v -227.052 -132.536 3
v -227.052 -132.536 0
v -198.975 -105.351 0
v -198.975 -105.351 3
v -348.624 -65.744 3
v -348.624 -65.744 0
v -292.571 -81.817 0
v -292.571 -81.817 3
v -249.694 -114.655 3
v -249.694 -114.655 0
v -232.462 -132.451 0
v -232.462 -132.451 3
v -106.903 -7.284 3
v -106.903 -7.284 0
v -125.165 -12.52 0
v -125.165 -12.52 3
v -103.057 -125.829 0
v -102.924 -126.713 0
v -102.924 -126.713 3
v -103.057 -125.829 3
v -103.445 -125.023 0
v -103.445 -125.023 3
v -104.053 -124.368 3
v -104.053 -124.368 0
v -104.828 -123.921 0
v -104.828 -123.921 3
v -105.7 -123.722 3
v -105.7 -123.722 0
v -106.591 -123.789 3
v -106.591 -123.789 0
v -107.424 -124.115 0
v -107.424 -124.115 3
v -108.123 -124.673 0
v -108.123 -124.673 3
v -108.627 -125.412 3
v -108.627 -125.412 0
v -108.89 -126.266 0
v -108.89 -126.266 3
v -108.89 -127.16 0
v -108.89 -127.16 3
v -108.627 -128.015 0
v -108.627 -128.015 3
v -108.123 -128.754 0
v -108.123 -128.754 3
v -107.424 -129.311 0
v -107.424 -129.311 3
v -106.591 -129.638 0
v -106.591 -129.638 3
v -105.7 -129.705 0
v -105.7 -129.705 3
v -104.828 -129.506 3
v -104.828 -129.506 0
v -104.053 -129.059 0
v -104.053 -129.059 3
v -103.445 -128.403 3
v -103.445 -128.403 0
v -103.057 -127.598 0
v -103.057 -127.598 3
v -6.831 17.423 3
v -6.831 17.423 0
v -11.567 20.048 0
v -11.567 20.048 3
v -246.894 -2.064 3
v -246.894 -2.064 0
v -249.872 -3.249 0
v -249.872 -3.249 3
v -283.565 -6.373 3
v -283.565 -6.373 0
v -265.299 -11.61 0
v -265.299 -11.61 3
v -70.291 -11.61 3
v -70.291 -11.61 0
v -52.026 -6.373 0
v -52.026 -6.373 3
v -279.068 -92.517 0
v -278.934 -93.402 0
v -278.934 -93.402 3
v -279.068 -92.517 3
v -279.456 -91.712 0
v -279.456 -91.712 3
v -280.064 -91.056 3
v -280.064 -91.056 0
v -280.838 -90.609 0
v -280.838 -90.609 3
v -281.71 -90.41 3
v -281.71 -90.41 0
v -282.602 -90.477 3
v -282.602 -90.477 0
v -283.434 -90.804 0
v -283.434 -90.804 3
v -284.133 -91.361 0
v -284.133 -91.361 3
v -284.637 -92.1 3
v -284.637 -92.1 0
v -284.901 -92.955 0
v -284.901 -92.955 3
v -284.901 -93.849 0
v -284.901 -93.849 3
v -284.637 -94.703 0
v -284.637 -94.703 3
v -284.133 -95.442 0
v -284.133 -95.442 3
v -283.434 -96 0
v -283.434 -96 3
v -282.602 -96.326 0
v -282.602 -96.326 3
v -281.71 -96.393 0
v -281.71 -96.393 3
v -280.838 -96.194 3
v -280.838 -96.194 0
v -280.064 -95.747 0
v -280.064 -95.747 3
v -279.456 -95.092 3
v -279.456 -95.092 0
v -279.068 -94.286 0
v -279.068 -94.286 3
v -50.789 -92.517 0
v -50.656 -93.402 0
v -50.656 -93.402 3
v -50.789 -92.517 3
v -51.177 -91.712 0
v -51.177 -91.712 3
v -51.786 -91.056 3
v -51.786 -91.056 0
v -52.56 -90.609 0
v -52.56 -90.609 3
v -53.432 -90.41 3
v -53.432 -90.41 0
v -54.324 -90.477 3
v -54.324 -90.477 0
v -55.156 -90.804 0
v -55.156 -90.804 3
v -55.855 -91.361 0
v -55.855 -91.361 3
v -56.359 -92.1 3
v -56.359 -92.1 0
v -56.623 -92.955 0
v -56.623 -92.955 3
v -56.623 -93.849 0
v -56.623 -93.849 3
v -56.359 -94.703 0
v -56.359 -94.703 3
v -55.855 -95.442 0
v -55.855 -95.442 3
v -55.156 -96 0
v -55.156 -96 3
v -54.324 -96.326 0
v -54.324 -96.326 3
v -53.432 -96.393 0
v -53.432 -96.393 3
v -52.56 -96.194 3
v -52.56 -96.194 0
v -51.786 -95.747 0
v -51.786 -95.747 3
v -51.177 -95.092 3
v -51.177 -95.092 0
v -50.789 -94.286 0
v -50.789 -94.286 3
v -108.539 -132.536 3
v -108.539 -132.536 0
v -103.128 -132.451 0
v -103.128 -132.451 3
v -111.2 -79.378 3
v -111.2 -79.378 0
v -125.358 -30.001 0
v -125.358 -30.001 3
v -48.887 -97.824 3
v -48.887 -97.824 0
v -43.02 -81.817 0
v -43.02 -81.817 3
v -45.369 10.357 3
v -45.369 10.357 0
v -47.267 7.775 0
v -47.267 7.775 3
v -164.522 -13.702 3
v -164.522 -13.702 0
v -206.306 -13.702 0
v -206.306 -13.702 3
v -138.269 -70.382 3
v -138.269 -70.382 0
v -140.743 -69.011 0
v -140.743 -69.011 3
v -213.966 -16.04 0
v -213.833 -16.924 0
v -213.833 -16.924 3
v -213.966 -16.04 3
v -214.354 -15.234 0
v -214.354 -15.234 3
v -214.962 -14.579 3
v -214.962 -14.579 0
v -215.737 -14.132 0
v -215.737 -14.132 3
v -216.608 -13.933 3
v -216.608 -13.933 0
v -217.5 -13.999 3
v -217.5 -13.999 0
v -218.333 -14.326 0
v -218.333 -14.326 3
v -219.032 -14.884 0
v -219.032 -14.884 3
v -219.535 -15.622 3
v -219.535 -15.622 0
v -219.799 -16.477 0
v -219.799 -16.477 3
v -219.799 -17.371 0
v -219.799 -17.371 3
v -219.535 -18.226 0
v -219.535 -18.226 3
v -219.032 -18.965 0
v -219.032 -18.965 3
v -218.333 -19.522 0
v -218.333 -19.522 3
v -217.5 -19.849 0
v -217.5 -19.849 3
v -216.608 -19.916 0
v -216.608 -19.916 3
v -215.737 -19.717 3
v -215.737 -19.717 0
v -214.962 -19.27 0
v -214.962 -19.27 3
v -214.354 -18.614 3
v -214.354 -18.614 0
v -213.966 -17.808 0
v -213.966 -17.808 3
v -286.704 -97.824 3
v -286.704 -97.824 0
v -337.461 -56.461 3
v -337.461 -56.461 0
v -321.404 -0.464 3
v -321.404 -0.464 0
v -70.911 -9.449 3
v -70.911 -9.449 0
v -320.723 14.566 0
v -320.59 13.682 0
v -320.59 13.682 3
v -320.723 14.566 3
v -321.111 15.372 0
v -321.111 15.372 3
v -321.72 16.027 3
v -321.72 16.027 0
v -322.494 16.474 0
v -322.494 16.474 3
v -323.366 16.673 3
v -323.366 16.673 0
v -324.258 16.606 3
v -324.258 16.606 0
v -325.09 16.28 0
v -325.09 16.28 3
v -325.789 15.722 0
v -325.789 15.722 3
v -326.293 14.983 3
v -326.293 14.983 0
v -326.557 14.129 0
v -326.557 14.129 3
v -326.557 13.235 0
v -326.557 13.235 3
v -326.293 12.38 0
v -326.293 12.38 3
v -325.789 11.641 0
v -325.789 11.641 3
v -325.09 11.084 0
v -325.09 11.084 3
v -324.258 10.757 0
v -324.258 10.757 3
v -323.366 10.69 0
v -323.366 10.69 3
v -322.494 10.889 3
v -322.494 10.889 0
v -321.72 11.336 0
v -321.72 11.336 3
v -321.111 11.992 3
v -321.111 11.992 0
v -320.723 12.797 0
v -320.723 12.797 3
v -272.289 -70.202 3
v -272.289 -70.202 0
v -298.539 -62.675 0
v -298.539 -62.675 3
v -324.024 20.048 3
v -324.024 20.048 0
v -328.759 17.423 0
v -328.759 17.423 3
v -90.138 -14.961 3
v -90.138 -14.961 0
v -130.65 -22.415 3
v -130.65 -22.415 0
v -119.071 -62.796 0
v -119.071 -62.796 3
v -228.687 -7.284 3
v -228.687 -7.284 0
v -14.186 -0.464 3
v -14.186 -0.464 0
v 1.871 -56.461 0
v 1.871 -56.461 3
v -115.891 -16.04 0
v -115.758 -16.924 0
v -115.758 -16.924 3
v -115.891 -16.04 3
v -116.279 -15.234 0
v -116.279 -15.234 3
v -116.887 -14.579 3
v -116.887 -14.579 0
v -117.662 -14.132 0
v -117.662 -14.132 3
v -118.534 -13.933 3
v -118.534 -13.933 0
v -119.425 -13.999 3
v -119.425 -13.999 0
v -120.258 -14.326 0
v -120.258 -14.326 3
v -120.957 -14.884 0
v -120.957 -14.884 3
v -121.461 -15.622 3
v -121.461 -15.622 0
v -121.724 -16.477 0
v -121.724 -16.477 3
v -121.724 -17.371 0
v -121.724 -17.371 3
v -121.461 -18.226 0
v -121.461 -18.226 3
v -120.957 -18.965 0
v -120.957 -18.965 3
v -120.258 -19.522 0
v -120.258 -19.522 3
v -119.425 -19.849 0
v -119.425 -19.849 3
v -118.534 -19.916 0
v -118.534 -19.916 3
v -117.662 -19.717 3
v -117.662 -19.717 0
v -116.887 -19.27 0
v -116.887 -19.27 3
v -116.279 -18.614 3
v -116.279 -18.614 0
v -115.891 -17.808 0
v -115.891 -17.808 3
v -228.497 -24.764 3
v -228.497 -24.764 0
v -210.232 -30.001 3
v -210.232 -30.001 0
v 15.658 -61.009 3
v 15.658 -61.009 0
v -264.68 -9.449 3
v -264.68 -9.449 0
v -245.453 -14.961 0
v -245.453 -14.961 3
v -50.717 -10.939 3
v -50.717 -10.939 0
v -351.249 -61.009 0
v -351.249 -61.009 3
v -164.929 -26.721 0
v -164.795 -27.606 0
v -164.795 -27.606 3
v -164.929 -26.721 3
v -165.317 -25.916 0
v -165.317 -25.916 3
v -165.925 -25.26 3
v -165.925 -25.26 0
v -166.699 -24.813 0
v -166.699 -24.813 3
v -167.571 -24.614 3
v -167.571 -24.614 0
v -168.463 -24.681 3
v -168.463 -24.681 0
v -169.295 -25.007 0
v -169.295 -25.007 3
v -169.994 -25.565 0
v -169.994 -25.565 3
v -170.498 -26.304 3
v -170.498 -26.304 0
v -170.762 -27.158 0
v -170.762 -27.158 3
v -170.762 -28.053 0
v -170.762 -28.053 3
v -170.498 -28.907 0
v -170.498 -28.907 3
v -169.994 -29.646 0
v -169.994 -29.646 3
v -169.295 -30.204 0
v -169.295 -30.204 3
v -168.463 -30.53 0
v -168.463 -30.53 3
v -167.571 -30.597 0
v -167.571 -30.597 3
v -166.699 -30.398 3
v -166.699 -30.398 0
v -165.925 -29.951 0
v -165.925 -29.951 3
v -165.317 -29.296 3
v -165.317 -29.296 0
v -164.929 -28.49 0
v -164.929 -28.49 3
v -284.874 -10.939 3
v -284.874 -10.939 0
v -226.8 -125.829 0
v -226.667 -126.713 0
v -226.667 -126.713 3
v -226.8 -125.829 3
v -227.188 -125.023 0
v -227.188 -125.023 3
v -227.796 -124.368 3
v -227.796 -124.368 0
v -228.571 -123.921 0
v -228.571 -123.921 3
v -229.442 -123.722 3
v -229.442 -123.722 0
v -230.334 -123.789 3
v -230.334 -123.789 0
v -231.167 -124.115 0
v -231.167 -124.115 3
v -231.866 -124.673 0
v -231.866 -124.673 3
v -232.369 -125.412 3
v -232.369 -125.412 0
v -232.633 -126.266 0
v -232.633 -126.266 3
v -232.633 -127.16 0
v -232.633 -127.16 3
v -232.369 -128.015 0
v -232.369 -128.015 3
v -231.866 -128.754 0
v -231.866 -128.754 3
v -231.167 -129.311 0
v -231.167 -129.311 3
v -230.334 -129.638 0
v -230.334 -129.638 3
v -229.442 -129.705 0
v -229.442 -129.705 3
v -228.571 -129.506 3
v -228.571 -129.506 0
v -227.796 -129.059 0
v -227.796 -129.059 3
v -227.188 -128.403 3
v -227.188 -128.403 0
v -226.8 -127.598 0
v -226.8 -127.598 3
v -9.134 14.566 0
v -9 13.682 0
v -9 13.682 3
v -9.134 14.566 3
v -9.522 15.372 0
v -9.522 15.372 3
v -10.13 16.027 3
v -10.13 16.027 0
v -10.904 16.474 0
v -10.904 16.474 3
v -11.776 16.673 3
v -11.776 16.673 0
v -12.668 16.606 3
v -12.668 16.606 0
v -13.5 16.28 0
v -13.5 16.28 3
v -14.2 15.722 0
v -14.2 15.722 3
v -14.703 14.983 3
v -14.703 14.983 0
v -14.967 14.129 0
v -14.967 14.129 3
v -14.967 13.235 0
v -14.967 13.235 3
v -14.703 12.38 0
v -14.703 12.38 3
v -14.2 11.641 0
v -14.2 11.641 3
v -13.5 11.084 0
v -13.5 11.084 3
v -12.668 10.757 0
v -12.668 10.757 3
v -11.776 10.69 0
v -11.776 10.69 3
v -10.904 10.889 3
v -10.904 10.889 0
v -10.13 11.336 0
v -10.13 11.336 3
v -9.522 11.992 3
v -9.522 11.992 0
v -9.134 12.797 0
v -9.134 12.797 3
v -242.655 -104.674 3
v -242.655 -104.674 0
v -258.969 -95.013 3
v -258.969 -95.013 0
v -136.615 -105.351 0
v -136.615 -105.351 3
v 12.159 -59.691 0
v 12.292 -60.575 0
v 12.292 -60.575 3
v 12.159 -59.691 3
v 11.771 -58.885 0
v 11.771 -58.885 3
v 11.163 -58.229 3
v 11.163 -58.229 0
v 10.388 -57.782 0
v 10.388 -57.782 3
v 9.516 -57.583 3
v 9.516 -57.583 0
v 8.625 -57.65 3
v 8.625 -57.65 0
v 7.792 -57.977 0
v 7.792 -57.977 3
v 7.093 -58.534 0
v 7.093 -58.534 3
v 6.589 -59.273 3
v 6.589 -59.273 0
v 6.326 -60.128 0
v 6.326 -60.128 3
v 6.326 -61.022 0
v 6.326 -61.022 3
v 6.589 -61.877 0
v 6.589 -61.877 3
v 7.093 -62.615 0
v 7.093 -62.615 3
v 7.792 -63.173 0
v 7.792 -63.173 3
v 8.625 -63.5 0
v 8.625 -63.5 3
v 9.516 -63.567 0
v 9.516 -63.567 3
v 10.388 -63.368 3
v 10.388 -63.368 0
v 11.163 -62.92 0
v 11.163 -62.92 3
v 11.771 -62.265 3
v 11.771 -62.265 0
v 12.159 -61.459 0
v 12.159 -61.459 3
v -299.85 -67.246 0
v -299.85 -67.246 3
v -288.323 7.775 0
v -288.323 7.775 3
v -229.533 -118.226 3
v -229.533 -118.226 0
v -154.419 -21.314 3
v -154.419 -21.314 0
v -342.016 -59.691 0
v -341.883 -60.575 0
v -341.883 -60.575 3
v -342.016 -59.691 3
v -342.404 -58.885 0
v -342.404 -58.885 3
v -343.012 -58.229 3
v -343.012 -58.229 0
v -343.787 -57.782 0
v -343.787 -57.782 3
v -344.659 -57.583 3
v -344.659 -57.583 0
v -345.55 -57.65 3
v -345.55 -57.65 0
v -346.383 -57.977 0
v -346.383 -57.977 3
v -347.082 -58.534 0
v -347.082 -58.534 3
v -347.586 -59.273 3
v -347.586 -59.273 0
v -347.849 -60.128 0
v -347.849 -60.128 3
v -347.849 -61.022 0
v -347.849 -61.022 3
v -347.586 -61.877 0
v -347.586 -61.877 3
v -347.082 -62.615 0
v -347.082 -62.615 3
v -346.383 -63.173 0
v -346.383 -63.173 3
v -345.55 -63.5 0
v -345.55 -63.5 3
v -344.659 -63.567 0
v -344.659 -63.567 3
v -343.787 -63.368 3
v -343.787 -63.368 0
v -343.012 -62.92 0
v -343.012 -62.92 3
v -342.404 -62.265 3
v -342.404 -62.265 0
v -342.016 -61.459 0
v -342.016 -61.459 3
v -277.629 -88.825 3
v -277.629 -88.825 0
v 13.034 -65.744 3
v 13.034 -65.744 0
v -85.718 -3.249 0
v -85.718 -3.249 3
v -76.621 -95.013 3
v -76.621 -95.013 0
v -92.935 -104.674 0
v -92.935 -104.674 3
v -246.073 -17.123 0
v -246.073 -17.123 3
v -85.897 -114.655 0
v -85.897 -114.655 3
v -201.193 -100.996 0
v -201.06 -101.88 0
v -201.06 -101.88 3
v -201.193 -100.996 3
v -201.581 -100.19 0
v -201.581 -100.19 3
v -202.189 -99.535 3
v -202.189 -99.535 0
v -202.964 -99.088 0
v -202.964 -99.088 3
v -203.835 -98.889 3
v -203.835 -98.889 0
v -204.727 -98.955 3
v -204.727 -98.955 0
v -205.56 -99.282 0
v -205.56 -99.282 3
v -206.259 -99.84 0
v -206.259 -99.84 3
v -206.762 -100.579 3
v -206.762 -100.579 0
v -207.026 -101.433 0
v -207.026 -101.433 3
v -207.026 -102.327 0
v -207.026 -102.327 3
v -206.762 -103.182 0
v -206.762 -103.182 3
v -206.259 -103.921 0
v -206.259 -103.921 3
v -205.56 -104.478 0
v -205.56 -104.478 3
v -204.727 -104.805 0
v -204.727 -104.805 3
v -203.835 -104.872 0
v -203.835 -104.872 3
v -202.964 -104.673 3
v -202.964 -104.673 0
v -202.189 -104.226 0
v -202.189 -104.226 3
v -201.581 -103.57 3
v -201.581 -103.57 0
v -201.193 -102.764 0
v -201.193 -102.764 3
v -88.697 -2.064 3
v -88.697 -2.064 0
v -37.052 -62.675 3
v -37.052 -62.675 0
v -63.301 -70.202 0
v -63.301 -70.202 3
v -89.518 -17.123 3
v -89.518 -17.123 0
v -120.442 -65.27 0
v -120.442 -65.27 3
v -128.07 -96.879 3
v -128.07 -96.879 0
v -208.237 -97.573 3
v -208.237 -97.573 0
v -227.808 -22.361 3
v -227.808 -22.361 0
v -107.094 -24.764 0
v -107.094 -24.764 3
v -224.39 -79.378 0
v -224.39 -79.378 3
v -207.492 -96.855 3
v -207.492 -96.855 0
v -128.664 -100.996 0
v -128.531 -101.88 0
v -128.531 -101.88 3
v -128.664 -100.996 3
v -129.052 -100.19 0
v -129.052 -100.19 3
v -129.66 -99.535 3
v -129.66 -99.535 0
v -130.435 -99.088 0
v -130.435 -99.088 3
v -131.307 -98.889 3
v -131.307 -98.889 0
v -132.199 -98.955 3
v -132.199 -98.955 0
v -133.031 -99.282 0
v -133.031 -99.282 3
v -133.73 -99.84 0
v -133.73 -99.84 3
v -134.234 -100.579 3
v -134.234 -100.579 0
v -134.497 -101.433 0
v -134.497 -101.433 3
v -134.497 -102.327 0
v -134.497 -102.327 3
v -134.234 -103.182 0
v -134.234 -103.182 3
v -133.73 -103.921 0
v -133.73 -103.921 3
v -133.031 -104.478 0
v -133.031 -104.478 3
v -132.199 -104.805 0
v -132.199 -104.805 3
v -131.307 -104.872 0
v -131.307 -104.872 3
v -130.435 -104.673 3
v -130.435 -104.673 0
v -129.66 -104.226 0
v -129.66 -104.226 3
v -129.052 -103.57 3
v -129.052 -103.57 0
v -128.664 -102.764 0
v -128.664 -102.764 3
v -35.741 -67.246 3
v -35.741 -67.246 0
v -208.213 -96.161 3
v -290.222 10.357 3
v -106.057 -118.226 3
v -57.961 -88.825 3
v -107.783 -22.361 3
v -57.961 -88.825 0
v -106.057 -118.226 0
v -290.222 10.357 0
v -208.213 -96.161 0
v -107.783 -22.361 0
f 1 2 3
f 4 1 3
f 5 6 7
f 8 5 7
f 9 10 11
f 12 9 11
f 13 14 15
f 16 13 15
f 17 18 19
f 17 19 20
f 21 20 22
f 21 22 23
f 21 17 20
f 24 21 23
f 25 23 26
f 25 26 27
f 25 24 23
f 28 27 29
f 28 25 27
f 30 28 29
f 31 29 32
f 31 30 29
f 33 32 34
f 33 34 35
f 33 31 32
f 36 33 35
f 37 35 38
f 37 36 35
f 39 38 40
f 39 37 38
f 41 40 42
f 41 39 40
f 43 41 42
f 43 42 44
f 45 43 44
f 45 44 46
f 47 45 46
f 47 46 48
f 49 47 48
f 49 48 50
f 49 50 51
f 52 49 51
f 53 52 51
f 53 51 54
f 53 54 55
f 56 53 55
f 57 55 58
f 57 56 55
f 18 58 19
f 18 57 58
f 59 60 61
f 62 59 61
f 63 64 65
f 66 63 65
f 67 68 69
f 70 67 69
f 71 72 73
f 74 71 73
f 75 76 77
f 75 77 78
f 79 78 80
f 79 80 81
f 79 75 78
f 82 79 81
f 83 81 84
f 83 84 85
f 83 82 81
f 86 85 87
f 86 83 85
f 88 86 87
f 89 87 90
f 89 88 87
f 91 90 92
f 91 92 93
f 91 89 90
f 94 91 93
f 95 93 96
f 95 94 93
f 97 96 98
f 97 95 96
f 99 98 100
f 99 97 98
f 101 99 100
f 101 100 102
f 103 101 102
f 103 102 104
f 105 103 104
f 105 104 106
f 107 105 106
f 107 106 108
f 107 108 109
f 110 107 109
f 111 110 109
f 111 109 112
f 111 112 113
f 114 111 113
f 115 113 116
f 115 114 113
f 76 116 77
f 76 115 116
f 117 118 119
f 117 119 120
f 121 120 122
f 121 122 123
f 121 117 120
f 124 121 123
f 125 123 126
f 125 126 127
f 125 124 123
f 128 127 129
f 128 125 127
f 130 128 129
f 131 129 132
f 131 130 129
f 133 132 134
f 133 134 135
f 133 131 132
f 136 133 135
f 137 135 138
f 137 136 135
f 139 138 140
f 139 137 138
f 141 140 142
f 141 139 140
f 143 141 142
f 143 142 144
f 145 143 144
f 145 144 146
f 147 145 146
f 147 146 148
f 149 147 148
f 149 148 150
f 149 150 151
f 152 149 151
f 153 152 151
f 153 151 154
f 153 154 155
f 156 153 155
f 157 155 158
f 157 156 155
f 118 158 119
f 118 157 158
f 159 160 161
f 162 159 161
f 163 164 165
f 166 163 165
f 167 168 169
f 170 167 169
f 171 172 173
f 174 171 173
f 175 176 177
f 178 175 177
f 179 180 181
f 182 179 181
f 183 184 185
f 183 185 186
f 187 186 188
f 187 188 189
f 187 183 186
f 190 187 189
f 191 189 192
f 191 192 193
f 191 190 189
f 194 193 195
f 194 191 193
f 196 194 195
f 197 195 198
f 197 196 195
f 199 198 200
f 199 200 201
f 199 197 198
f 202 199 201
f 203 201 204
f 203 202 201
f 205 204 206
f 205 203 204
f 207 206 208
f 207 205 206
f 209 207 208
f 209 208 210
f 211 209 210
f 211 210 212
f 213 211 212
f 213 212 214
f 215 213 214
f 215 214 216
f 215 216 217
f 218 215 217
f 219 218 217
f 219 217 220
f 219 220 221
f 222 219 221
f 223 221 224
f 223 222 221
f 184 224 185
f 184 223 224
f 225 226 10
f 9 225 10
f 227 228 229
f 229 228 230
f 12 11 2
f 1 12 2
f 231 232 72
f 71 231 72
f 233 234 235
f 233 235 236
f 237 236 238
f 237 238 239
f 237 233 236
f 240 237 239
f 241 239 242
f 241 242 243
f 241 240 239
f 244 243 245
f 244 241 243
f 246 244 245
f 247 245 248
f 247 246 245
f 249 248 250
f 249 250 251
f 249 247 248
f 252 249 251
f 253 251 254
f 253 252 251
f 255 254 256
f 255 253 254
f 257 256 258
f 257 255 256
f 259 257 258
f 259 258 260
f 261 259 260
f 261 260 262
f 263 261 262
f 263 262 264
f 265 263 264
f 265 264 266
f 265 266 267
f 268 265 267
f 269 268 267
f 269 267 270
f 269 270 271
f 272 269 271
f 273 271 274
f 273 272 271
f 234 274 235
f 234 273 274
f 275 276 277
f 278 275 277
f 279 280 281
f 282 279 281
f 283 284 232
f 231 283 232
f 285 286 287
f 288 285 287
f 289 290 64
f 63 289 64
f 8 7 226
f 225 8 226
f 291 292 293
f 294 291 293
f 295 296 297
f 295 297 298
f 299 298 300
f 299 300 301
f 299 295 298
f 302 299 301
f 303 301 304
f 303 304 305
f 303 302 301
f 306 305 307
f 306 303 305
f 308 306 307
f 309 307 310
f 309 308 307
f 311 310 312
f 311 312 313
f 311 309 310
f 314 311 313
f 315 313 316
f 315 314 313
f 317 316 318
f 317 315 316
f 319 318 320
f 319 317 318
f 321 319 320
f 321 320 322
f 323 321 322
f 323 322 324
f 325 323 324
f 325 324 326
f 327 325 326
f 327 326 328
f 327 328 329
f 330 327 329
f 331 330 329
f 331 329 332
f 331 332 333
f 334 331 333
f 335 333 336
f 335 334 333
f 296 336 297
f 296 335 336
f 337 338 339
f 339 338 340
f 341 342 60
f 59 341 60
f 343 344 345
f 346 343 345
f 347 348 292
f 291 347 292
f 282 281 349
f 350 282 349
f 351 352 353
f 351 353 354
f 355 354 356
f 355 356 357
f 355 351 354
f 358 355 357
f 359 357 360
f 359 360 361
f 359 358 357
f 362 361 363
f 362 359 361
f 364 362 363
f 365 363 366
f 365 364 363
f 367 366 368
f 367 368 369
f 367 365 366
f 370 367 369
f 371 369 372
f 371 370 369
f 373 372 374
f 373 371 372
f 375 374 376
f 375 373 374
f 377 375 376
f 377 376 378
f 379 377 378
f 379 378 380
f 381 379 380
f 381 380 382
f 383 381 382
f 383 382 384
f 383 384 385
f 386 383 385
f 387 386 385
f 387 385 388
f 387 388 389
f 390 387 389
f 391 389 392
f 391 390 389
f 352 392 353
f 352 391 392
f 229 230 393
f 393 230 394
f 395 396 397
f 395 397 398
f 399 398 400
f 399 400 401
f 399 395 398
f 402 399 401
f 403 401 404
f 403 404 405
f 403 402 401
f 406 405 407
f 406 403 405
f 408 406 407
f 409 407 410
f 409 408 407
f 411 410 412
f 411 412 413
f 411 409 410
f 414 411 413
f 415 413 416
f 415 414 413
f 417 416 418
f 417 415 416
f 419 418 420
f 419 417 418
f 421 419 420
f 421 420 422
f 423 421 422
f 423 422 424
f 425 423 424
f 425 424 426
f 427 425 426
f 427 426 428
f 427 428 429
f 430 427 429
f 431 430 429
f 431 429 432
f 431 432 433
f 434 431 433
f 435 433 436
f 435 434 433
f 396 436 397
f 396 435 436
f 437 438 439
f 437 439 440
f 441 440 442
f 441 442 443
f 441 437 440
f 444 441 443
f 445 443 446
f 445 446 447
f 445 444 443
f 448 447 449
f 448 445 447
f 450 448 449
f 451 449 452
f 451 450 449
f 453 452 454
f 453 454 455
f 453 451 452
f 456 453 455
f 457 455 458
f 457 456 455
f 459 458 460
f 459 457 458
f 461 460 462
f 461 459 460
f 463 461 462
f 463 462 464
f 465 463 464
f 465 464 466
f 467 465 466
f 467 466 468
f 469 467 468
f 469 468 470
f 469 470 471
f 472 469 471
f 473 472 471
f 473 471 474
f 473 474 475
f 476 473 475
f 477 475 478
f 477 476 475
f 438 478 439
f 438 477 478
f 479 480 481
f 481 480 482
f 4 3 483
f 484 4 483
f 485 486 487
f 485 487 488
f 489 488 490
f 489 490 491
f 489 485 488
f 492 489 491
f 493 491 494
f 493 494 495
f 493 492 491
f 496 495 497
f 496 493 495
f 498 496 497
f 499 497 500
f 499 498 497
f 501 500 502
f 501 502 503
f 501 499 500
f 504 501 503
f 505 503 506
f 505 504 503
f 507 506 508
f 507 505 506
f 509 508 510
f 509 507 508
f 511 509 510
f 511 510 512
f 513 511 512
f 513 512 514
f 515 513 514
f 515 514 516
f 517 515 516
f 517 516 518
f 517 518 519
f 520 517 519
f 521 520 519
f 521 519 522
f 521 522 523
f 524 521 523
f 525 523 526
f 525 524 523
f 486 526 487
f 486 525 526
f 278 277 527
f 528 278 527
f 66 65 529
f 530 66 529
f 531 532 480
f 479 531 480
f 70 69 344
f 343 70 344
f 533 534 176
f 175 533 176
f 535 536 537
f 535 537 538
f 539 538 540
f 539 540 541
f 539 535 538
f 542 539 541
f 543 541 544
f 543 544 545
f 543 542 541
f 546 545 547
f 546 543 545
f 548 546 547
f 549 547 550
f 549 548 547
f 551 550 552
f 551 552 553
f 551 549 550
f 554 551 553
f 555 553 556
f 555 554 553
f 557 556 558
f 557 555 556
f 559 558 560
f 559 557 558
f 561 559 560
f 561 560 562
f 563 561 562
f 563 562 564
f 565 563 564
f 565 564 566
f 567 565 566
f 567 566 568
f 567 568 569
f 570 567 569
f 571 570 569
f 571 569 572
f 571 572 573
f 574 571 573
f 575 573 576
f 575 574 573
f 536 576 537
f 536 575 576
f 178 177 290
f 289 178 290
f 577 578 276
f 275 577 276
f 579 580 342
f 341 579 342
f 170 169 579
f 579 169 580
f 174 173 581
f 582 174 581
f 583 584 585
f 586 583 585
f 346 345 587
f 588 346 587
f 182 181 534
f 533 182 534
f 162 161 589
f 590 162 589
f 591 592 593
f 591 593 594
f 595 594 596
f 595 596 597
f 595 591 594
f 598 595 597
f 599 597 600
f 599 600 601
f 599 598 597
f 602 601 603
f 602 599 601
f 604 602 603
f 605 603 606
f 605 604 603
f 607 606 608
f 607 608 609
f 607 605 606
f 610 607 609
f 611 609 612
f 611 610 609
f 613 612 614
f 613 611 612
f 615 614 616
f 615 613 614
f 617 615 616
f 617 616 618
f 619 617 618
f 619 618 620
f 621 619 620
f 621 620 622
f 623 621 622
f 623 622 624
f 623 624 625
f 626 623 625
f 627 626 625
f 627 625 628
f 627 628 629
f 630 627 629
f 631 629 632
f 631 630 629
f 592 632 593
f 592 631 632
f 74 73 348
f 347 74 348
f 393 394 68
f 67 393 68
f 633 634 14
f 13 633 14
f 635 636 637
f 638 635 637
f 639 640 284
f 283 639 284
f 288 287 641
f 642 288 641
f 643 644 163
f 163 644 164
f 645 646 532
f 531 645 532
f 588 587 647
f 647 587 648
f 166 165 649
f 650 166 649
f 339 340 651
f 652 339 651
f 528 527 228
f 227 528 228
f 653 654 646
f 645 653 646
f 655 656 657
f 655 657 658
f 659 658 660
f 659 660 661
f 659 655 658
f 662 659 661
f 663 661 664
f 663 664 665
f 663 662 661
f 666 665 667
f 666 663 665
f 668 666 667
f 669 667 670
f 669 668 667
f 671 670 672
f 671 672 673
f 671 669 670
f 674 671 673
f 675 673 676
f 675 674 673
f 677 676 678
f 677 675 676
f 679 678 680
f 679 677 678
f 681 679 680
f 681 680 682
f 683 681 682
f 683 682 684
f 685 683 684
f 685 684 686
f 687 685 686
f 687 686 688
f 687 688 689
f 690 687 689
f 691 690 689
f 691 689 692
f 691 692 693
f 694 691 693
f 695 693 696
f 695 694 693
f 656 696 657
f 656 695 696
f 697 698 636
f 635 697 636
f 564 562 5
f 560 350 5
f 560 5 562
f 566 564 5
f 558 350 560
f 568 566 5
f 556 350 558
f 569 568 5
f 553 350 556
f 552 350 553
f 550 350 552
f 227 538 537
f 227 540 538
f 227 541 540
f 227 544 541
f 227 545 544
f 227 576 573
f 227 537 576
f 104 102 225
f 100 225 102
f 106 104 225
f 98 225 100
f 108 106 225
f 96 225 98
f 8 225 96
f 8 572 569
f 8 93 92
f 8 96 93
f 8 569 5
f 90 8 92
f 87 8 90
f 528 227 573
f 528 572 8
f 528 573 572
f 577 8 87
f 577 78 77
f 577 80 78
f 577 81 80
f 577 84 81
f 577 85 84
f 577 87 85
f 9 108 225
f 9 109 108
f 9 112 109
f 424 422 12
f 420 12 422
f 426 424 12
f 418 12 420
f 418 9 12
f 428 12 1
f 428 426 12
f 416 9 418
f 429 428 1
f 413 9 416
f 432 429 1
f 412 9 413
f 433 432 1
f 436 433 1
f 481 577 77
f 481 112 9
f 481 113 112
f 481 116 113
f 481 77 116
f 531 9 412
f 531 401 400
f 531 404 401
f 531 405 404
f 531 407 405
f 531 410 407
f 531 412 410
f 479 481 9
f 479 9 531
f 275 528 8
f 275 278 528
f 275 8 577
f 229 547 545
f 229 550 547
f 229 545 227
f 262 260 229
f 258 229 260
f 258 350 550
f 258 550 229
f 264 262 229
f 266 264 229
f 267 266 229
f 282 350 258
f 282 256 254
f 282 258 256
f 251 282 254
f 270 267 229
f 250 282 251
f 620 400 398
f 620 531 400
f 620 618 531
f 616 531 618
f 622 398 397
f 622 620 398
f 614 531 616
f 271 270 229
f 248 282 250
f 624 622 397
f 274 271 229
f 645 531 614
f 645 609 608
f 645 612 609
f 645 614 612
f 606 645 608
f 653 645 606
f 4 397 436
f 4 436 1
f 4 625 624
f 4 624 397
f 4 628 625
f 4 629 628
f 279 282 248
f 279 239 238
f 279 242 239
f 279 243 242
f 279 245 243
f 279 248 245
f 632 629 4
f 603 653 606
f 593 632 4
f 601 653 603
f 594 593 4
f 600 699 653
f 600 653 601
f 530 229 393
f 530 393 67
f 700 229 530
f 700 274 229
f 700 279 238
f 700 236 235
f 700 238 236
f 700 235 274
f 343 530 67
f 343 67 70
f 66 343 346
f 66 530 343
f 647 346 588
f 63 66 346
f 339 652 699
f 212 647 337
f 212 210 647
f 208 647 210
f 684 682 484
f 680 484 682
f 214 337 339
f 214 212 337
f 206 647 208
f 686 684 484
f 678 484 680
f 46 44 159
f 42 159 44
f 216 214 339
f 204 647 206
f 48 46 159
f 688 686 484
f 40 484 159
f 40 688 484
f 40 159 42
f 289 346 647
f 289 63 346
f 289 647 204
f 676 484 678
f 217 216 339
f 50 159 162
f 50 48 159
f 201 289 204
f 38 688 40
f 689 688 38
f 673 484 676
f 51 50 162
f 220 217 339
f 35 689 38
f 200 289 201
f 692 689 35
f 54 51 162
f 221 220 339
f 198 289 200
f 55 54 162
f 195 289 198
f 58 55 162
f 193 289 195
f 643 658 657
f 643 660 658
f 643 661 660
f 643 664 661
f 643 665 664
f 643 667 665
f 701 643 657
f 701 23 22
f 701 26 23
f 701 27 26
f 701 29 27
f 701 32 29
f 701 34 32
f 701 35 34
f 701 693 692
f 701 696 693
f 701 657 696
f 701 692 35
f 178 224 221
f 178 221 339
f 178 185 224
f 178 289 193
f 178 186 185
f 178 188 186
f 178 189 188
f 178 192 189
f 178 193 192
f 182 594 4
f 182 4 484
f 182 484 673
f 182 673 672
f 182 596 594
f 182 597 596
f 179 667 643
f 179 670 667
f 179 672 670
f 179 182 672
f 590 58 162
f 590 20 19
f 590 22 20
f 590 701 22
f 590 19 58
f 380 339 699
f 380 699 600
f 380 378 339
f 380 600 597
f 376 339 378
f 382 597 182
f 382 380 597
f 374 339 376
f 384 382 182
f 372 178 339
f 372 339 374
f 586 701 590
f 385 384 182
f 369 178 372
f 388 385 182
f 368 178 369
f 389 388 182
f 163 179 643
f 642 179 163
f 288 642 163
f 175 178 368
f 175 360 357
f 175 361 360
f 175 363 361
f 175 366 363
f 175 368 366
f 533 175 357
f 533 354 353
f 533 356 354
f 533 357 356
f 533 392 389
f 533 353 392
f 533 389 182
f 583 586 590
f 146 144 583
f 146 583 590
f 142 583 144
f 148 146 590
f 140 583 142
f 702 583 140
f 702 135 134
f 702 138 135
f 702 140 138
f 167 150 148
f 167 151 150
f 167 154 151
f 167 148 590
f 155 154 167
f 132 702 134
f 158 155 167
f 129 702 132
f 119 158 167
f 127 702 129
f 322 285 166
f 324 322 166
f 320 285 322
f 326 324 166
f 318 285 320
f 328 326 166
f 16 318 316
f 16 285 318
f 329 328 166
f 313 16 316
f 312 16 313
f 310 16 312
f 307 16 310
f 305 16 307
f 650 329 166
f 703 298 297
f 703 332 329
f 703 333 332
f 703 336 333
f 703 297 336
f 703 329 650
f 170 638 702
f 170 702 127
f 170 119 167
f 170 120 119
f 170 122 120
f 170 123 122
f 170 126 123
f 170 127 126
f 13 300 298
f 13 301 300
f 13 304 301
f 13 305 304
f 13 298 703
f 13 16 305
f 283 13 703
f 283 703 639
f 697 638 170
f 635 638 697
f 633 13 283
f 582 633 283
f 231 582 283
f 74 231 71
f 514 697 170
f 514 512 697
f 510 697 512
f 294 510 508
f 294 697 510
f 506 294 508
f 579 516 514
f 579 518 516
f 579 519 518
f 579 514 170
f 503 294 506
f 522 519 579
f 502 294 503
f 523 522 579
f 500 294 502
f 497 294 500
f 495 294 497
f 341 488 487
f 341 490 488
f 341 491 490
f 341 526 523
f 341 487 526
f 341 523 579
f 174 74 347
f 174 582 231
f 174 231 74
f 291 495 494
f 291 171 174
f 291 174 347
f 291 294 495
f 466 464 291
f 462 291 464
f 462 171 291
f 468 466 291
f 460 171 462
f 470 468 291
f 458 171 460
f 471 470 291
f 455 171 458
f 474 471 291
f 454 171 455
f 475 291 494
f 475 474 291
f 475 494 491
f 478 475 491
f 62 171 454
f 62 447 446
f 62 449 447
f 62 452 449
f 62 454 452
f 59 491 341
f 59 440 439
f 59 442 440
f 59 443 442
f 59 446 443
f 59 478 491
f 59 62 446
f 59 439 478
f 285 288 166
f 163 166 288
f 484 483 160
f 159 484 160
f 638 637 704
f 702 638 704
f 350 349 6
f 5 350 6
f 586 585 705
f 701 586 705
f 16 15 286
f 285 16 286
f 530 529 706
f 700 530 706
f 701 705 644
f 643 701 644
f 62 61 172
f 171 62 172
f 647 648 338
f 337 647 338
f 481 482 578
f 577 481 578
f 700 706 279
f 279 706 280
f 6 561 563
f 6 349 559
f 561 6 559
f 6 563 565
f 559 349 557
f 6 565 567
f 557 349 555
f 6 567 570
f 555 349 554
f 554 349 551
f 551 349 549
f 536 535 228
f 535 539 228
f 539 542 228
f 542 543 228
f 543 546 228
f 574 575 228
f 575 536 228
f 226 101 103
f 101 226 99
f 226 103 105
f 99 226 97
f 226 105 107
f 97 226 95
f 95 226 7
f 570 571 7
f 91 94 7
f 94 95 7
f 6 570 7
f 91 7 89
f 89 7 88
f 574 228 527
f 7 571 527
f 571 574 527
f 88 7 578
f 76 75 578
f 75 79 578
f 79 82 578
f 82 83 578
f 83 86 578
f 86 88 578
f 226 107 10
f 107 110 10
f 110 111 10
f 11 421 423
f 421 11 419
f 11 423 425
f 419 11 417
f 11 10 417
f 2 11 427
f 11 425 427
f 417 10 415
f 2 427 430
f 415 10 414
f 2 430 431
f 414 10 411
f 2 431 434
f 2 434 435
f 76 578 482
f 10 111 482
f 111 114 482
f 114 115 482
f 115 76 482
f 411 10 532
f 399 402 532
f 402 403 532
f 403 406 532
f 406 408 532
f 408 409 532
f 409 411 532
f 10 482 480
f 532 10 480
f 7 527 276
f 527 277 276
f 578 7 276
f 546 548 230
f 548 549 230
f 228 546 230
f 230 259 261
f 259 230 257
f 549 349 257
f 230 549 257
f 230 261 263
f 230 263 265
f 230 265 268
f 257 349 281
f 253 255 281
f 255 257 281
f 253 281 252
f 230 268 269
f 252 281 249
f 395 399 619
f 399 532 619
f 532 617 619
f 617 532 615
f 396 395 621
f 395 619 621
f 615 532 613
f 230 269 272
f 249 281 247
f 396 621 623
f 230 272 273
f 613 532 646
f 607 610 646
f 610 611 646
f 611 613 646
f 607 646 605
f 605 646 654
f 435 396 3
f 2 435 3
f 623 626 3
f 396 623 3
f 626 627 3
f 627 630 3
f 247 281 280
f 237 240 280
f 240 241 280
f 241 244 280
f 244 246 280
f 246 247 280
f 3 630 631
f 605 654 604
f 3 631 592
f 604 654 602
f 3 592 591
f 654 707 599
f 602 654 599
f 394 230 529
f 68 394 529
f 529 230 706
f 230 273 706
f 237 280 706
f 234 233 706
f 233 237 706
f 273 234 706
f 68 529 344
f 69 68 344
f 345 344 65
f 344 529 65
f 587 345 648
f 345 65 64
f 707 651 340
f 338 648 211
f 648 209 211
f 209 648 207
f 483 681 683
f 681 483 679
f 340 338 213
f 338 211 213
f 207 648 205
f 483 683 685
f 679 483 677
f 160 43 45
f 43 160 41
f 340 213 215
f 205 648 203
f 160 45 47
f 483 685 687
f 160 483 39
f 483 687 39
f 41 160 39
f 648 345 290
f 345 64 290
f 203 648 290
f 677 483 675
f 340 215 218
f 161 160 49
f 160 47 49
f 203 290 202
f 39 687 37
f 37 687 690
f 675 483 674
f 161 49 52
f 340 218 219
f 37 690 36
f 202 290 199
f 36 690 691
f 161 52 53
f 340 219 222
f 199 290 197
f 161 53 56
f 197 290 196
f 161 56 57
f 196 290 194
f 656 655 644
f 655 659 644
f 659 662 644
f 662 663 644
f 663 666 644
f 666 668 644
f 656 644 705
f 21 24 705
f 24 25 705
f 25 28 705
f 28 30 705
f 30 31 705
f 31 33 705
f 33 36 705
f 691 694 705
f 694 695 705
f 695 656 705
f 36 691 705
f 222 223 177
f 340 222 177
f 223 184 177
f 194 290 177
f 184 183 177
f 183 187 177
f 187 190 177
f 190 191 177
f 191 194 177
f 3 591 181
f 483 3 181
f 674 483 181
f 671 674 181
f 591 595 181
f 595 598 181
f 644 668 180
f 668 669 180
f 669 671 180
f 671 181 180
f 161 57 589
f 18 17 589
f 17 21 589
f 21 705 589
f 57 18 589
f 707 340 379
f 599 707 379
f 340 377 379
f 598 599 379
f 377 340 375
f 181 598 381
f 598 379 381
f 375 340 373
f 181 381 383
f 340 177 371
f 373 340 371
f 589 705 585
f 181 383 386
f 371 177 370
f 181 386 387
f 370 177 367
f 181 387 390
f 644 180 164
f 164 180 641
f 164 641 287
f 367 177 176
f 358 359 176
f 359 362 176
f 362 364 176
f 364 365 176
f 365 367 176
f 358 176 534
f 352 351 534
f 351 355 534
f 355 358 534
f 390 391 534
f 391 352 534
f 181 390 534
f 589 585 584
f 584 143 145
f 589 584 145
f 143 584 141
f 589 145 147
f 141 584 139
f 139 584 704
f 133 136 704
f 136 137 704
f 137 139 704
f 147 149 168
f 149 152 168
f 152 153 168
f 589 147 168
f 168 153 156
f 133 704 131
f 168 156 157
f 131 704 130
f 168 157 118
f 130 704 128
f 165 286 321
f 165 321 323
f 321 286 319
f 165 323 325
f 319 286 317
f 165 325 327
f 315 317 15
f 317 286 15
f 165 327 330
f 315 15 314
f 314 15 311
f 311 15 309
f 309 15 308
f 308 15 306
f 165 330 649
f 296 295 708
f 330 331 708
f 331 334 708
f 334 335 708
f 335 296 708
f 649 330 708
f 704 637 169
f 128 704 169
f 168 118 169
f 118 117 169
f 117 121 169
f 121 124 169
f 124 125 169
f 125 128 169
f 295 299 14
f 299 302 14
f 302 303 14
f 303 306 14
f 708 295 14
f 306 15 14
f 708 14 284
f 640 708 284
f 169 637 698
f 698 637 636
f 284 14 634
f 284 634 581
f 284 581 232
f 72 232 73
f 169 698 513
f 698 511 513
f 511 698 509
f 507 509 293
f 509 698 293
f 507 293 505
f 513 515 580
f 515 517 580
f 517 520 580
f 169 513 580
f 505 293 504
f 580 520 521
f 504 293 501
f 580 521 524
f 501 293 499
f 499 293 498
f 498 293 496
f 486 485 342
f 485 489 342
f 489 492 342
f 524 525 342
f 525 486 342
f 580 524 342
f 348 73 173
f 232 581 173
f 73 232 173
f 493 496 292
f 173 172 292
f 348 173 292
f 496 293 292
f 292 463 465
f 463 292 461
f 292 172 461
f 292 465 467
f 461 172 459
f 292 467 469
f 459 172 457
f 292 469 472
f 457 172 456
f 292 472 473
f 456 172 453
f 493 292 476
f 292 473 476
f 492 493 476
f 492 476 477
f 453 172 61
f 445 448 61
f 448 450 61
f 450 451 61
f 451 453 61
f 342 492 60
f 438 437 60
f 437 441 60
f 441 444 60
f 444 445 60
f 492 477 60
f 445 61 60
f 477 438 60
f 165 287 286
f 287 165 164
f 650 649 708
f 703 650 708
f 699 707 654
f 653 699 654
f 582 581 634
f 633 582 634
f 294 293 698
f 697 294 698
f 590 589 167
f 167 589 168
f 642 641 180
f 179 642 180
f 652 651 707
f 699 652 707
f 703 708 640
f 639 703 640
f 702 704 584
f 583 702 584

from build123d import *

# Parameters (mm, degrees)
ESQUISSE1_R        = 3
BOSS_EXTRU_1_DEPTH = 3


with BuildPart() as part:
    # Esquisse1 → Boss.-Extru.1 (new body)
    with BuildSketch(Plane.XY):
        Polygon((-130.649820486, -22.415487094), (-119.070790786, -62.796362516), (-120.442039466, -65.27016062), (-138.268849115, -70.381916029), (-140.742647218, -69.010667349), (-154.419403971, -21.314148304), (-164.521687886, -13.701531345), (-206.306232172, -13.701531345), (-228.687205956, -7.283890383), (-246.894010665, -2.064269008), (-249.872259625, -3.248768002), (-288.323340616, 7.774587685), (-290.221637422, 10.357120157), (-324.023652204, 20.047657387), (-328.759186056, 17.422535954), (-351.248940808, -61.008559605), (-348.624077987, -65.743937486), (-292.570685007, -81.816989279), (-286.703799003, -97.823971184), (-249.693611115, -114.655437515), (-232.462472657, -132.451258614), (-227.051679806, -132.536382762), (-198.975350278, -105.350948678), (-136.615169465, -105.350948678), (-108.538839937, -132.536382762), (-103.128047086, -132.451258614), (-85.896908628, -114.655437515), (-48.88672074, -97.823971184), (-43.019834736, -81.816989279), (13.033558244, -65.743937486), (15.658421065, -61.008559605), (-6.831333687, 17.422535954), (-11.566867539, 20.047657387), (-45.368882322, 10.357120157), (-47.267179127, 7.774587685), (-85.718260118, -3.248768002), (-88.696509078, -2.064269008), (-106.903313787, -7.283890383), (-125.164825765, -12.52029468), align=None)
        with Locations((9.292284284, -60.574933915)):
            Circle(ESQUISSE1_R, mode=Mode.SUBTRACT)
        with Locations((-323.590068827, 13.68165837)):
            Circle(ESQUISSE1_R, mode=Mode.SUBTRACT)
        with Locations((-216.832585966, -16.924131519)):
            Circle(ESQUISSE1_R, mode=Mode.SUBTRACT)
        with Locations((-167.795259872, -27.605548894)):
            Circle(ESQUISSE1_R, mode=Mode.SUBTRACT)
        with Locations((-118.757933777, -16.924131519)):
            Circle(ESQUISSE1_R, mode=Mode.SUBTRACT)
        with Locations((-12.000450916, 13.68165837)):
            Circle(ESQUISSE1_R, mode=Mode.SUBTRACT)
        with Locations((-229.666591606, -126.713325795)):
            Circle(ESQUISSE1_R, mode=Mode.SUBTRACT)
        with Locations((-204.059552706, -101.880200807)):
            Circle(ESQUISSE1_R, mode=Mode.SUBTRACT)
        with Locations((-281.934339477, -93.401689518)):
            Circle(ESQUISSE1_R, mode=Mode.SUBTRACT)
        with Locations((-344.882804027, -60.574933915)):
            Circle(ESQUISSE1_R, mode=Mode.SUBTRACT)
        Polygon((-210.232188047, -30.001147656), (-224.390430785, -79.377961929), (-208.212806214, -96.161100182), (-207.491865187, -96.85509979), (-208.236606037, -97.572971364), (-229.533063287, -118.225792128), (-242.655085998, -104.673746846), (-258.969310369, -95.012679745), (-277.629290011, -88.825419148), (-272.289144354, -70.202118055), (-298.538981418, -62.6750984), (-299.849714513, -67.246167925), (-337.461409717, -56.461187875), (-321.404434006, -0.463858857), (-284.873898651, -10.938821309), (-283.564528345, -6.372504389), (-265.299260667, -11.609985616), (-264.679553884, -9.448811229), (-245.452786066, -14.960840928), (-246.072799476, -17.123084647), (-227.807531798, -22.360565873), (-228.496674065, -24.763890567), align=None, mode=Mode.SUBTRACT)
        with Locations((-105.923928137, -126.713325795)):
            Circle(ESQUISSE1_R, mode=Mode.SUBTRACT)
        with Locations((-131.530967037, -101.880200807)):
            Circle(ESQUISSE1_R, mode=Mode.SUBTRACT)
        with Locations((-53.656180266, -93.401689518)):
            Circle(ESQUISSE1_R, mode=Mode.SUBTRACT)
        Polygon((-106.057456456, -118.225792128), (-128.0696158, -96.878899722), (-111.200088958, -79.377961929), (-125.358331696, -30.001147656), (-107.093845678, -24.763890567), (-107.782987945, -22.360565873), (-89.517720268, -17.123084647), (-90.137733677, -14.960840928), (-70.910965859, -9.448811229), (-70.291259076, -11.609985616), (-52.025991399, -6.372504389), (-50.716621092, -10.938821309), (-14.186085737, -0.463858857), (1.870889973, -56.461187875), (-35.740805231, -67.246167925), (-37.051538325, -62.6750984), (-63.301375389, -70.202118055), (-57.961229733, -88.825419148), (-76.621209374, -95.012679745), (-92.935433745, -104.673746846), align=None, mode=Mode.SUBTRACT)
    extrude(amount=BOSS_EXTRU_1_DEPTH)


solid = part.part
